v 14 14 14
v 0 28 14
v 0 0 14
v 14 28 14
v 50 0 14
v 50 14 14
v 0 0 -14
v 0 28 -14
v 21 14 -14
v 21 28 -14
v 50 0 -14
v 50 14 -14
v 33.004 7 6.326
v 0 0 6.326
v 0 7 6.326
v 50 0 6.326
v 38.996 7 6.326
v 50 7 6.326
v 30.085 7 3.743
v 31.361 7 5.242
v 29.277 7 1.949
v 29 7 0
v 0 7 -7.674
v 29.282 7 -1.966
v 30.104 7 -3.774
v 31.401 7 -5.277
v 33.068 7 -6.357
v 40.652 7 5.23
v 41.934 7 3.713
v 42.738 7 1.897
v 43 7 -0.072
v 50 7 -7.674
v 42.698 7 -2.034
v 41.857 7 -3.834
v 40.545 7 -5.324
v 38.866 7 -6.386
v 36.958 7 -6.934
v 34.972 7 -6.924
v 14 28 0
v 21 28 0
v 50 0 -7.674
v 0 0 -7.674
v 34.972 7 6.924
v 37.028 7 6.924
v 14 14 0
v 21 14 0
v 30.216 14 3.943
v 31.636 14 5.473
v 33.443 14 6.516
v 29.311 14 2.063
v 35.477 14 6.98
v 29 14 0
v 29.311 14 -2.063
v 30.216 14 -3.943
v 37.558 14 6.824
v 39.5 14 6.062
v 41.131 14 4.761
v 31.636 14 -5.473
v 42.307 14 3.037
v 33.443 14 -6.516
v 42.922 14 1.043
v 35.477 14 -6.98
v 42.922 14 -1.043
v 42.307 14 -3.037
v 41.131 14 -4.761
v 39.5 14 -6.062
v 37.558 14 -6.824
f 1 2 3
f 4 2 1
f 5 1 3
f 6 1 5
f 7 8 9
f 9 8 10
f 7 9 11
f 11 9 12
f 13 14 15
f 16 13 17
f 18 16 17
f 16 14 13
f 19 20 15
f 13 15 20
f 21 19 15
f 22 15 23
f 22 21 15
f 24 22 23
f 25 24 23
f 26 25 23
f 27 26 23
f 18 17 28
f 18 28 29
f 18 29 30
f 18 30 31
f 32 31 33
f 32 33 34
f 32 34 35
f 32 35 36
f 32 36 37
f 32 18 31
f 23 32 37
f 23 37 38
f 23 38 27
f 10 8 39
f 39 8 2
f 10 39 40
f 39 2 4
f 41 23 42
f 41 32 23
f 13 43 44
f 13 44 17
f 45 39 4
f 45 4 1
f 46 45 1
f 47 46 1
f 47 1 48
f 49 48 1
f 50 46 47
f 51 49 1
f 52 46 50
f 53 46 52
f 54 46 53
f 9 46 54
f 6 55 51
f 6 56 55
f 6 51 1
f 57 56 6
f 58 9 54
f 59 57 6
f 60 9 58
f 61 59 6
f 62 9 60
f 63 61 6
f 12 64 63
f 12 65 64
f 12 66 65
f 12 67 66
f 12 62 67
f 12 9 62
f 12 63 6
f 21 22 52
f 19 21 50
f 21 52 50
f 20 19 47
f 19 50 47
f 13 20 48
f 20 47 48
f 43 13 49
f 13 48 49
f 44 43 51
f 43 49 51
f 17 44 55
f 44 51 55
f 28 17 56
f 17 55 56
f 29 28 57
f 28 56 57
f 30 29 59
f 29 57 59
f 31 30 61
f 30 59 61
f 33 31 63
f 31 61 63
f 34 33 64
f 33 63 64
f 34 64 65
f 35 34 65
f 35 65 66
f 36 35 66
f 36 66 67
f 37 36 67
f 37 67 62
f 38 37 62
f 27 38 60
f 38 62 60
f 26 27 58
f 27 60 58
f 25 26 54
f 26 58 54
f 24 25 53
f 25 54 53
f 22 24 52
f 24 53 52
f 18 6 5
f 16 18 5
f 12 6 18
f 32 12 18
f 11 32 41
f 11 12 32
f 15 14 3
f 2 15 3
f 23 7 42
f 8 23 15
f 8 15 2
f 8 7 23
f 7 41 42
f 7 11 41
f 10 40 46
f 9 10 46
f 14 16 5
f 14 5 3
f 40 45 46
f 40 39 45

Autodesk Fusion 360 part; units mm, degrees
sketch "Sketch1" plane through (0, 0, 0) normal (0, 0, 1) x (1, 0, 0)
  line L0 (0, 0) -> (0, 28)
  line L1 (0, 28) -> (14, 28)
  line L2 (14, 28) -> (14, 14)
  line L3 (14, 14) -> (50, 14)
  line L4 (50, 14) -> (50, 0)
  line L5 (50, 0) -> (0, 0)
  dimension "d1" = 14
  dimension "d2" = 14
  dimension "d3" = 14
  dimension "d4" = 50
extrude "Extrude1" add sketch "Sketch1" along normal mid plane 28
sketch "Sketch2" plane through (0, 0, 0) normal (0, 0, 1) x (1, 0, 0)
  line L0 (14, 28) -> (21, 28)
  line L1 (21, 28) -> (21, 14)
  line L2 (21, 14) -> (14, 14)
  line L3 (14, 14) -> (14, 28)
  point P0 (14, 28)
  point P1 (14, 14)
  dimension "d7" = 7
  dimension "d8" = 14
extrude "Extrude2" add sketch "Sketch2" against normal blind 14
sketch "Sketch3" plane through (50, 0, 0) normal (1, 0, 0) x (0, 0, -1)
  line L0 (14, 14) -> (-14, 14)
  line L1 (-14, 14) -> (-14, 0)
  line L2 (-14, 0) -> (14, 0)
  line L3 (14, 0) -> (14, 14)
  line L4 (-6.3263, 0) -> (-6.3263, 7)
  line L5 (-6.3263, 7) -> (7.6737, 7)
  line L6 (7.6737, 7) -> (7.6737, 0)
  line L7 (0, 18) -> (0, 0) construction
  line L8 (0, 0) -> (0, -4) construction
  dimension "d11" = 14
  dimension "d12" = 14
  dimension "d13" = 14
  dimension "d14" = 7.6737
  dimension "d15" = 90
  dimension "d16" = 7
extrude "Extrude3" cut sketch "Sketch3" against normal blind 50 contours L2 L4 L5 L6
sketch "Sketch4" plane through (0, 14, 0) normal (0, 1, 0) x (-1, 0, 0)
  line L0 (-21, -14) -> (-21, 0)
  line L1 (-21, 0) -> (-14, 0)
  line L2 (-14, 0) -> (-14, 14)
  line L3 (-14, 14) -> (-50, 14)
  line L4 (-50, 14) -> (-50, -14)
  line L5 (-50, -14) -> (-21, -14)
  line L6 (5.2801, -7) -> (-65, -7) construction
  line L7 (5, 7) -> (-62.1492, 7) construction
  circle A0 centre (-36, 0) radius 7
  dimension "d19" = 7
  dimension "d20" = 7
  dimension "d21" = 14
  dimension "d22" = 14
extrude "Extrude4" cut sketch "Sketch4" against normal blind 7 contours A0
